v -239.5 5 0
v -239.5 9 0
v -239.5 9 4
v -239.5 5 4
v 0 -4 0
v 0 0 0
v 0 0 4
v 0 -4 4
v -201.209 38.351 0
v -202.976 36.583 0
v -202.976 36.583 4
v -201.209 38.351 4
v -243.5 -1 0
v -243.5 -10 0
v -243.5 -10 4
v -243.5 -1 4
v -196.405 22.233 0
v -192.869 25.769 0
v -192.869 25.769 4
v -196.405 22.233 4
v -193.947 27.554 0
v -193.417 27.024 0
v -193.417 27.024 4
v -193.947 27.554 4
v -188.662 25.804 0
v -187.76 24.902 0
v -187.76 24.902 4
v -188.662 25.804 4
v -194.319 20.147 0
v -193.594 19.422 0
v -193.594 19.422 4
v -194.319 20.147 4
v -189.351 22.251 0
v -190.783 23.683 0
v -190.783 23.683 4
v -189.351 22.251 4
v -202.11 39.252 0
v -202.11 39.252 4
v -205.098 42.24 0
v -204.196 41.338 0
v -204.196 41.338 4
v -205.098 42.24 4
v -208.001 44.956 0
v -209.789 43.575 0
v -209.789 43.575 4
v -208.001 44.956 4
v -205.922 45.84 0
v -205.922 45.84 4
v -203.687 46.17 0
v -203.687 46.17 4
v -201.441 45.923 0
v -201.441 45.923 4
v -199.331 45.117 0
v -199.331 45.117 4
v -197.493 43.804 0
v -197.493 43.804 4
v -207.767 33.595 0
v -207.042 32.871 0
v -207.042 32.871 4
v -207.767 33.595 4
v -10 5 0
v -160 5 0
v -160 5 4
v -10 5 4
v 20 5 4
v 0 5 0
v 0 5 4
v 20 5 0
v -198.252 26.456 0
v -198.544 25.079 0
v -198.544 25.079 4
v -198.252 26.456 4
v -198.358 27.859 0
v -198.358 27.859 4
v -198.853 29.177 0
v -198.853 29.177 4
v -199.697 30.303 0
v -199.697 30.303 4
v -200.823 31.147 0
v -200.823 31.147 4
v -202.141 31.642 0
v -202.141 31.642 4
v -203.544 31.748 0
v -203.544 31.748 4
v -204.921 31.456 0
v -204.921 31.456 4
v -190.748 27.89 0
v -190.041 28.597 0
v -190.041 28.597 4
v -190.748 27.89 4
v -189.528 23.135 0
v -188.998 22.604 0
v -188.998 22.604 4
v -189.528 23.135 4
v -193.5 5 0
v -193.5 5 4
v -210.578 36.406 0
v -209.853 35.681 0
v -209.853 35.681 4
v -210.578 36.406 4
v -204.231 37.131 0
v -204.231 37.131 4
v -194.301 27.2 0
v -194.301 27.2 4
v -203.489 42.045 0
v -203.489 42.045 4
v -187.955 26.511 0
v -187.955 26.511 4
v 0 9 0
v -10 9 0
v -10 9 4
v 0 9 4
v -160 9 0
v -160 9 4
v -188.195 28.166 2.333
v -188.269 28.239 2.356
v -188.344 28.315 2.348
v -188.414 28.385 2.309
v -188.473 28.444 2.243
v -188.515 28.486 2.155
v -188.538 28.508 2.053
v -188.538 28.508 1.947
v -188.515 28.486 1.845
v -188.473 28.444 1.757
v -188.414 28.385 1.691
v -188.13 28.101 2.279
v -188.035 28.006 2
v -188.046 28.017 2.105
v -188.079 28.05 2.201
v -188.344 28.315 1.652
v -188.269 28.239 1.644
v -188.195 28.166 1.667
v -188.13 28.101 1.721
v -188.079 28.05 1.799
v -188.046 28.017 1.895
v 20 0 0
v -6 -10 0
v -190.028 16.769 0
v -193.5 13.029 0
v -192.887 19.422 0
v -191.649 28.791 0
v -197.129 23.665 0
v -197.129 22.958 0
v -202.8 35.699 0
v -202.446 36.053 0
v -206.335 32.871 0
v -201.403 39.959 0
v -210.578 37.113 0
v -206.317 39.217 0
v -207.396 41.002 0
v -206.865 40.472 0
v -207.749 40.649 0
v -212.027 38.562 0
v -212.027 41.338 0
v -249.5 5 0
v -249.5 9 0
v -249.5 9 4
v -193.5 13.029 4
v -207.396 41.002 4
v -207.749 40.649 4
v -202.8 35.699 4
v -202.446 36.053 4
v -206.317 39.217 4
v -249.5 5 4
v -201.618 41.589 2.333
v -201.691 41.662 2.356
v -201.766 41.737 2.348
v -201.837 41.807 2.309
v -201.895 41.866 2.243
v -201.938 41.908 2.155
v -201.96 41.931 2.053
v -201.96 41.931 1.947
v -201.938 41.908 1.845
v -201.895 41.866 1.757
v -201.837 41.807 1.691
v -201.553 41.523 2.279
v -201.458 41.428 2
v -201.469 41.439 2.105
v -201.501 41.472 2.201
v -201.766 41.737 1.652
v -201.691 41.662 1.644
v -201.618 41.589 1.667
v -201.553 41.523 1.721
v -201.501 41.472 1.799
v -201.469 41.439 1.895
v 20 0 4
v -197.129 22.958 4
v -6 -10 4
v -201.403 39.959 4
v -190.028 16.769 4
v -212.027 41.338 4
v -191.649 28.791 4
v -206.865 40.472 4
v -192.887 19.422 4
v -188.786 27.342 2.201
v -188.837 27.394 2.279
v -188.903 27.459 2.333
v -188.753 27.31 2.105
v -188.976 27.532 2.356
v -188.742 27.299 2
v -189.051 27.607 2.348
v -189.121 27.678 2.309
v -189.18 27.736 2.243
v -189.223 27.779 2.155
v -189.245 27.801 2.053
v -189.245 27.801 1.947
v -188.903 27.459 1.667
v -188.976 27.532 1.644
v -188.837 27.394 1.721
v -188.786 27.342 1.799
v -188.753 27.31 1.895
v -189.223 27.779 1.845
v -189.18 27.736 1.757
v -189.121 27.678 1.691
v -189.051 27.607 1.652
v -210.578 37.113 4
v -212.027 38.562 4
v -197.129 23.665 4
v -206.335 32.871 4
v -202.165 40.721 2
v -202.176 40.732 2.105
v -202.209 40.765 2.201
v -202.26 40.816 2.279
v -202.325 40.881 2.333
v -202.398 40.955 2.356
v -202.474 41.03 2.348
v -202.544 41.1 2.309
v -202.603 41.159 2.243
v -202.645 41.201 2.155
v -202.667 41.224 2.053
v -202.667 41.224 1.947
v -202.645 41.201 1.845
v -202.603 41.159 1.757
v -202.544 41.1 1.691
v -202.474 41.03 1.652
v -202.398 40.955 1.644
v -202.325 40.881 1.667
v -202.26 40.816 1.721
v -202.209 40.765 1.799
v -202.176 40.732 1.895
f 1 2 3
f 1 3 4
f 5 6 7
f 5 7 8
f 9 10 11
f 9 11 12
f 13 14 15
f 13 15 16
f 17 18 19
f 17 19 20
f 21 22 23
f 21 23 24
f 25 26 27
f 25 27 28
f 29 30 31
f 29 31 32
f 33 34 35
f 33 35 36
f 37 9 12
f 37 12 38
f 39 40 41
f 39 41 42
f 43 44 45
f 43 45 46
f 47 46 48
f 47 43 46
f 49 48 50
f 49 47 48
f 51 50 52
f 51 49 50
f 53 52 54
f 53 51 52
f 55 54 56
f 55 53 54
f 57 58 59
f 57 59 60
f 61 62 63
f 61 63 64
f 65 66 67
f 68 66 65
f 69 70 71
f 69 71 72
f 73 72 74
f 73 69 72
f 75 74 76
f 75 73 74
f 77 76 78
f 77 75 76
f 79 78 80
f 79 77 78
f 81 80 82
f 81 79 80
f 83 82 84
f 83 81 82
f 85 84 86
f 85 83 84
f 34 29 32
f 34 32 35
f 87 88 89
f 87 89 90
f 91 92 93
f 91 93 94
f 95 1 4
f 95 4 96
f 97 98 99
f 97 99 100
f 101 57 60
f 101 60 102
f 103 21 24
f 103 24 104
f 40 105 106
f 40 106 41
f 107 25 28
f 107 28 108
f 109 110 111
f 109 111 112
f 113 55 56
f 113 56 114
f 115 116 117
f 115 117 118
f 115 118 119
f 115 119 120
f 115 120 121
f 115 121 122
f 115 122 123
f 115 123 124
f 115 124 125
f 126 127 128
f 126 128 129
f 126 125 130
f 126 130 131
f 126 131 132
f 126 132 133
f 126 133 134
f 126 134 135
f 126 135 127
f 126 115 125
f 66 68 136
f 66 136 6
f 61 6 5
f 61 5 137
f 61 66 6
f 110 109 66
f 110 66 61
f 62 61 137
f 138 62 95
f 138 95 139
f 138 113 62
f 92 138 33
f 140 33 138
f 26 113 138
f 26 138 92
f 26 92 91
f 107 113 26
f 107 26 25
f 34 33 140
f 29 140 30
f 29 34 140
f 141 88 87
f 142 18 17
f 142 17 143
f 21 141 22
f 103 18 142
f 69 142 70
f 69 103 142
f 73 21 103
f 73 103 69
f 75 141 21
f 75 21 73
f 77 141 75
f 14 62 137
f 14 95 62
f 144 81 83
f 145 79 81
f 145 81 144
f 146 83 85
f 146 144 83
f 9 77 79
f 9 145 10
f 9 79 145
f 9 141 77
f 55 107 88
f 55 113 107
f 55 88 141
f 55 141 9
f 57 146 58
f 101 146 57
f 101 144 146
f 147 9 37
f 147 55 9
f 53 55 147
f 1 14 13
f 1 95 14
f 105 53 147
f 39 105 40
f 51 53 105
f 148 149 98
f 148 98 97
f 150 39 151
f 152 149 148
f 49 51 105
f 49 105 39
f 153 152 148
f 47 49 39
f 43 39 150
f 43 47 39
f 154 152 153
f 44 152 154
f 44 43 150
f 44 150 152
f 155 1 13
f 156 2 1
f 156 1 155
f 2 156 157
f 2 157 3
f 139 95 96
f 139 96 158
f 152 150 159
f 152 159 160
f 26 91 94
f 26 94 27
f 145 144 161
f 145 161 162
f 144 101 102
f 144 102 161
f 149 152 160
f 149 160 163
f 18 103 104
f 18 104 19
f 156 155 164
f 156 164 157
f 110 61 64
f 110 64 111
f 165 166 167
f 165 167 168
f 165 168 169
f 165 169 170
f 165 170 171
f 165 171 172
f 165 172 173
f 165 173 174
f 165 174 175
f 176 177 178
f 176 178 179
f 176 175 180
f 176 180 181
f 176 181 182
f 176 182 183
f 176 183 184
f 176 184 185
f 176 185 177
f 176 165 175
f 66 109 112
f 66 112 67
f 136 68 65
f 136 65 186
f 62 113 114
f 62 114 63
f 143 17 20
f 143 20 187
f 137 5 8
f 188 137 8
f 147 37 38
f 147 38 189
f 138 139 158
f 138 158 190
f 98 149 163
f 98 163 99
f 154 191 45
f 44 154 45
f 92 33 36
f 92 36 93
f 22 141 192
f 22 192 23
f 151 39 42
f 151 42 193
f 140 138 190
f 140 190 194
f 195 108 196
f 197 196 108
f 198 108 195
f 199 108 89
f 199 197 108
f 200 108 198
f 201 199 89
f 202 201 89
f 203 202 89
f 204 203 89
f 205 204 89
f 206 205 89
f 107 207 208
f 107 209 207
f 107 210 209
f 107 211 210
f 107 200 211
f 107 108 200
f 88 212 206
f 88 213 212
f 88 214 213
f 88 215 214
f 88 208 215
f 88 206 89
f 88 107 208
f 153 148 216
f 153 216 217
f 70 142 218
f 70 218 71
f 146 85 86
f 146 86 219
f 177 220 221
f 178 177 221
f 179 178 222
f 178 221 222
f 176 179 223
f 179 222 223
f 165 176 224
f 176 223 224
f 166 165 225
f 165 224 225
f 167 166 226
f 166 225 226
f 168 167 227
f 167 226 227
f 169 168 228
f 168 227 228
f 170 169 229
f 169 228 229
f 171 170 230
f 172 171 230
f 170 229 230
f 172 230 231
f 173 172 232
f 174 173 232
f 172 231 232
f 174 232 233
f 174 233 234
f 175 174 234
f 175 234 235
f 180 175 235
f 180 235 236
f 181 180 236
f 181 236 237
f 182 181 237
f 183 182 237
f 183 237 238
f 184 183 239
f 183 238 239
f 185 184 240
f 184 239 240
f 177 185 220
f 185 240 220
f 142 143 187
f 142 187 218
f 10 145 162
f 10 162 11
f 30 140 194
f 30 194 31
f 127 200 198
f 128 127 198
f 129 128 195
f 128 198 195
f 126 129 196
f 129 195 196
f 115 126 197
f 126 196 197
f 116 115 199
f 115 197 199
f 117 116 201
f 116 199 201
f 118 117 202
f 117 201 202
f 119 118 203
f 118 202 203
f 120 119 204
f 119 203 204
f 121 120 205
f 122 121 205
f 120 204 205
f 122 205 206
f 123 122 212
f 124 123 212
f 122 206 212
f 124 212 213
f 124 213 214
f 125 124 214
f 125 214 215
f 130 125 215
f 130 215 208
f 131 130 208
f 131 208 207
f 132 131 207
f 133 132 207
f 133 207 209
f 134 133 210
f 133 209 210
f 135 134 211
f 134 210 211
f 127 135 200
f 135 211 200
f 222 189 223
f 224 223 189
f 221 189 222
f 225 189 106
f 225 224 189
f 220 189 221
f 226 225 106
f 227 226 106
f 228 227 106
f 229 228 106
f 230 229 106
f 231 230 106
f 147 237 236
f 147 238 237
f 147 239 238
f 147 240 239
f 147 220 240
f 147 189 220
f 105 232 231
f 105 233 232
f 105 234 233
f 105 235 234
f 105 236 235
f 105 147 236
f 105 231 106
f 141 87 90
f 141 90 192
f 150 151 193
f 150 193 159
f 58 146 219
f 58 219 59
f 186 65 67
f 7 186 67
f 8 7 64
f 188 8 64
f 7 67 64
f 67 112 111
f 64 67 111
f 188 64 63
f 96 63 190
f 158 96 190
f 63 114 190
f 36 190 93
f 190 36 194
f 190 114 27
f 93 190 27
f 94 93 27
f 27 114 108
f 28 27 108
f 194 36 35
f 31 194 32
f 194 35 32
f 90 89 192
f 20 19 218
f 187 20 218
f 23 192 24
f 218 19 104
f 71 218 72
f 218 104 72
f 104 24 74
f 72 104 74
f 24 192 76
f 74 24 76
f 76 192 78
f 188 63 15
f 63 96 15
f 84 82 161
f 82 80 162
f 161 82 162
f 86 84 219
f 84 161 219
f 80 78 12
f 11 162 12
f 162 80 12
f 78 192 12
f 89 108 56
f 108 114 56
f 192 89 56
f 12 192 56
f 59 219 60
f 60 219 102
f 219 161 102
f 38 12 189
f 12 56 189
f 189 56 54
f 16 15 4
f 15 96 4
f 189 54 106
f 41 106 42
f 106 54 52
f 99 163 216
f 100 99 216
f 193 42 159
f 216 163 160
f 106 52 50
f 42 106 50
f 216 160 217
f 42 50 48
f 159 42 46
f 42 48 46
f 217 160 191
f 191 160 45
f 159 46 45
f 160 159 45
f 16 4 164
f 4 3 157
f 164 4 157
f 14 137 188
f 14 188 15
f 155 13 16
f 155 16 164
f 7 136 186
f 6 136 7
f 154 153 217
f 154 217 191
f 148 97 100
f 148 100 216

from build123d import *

# Parameters (mm, degrees)
BOSS_EXTRUDE1_DEPTH = 4
CHAMFER1_SIZE       = 6
SKETCH2_R           = 0.357314597
CUT_EXTRUDE1_DEPTH  = 1


with BuildPart() as part:
    # Sketch1 → Boss-Extrude1 (new body)
    with BuildSketch(Plane.XY):
        with BuildLine():
            Line((-193.5, 5), (-193.5, 13.029022597))
            Line((-193.5, 13.029022597), (-190.028351822, 16.768866664))
            Line((-190.028351822, 16.768866664), (-192.886698165, 19.422232071))
            Line((-192.886698165, 19.422232071), (-193.593804946, 19.422232071))
            Line((-193.593804946, 19.422232071), (-194.318589397, 20.147016522))
            Line((-194.318589397, 20.147016522), (-190.783055491, 23.682550428))
            Line((-190.783055491, 23.682550428), (-189.351164259, 22.250659196))
            Line((-189.351164259, 22.250659196), (-188.997610869, 22.604212587))
            Line((-188.997610869, 22.604212587), (-189.527940955, 23.134542672))
            Line((-189.527940955, 23.134542672), (-187.760174002, 24.902309625))
            Line((-187.760174002, 24.902309625), (-188.661735148, 25.803870771))
            Line((-188.661735148, 25.803870771), (-187.954628366, 26.510977553))
            Line((-187.954628366, 26.510977553), (-190.040593371, 28.596942557))
            Line((-190.040593371, 28.596942557), (-190.747700152, 27.889835776))
            Line((-190.747700152, 27.889835776), (-191.649261298, 28.791396922))
            Line((-191.649261298, 28.791396922), (-193.417028251, 27.023629969))
            Line((-193.417028251, 27.023629969), (-193.947358337, 27.553960055))
            Line((-193.947358337, 27.553960055), (-194.300911728, 27.200406664))
            Line((-194.300911728, 27.200406664), (-192.869020496, 25.768515432))
            Line((-192.869020496, 25.768515432), (-196.404532161, 22.233003767))
            Line((-196.404532161, 22.233003767), (-197.129316611, 22.957788218))
            Line((-197.129316611, 22.957788218), (-197.129316611, 23.664894999))
            Line((-197.129316611, 23.664894999), (-198.543530174, 25.079108562))
            ThreePointArc((-198.543530174, 25.079108562), (-199.69683639, 30.30316361), (-204.920891438, 31.456469826))
            Line((-204.920891438, 31.456469826), (-206.335105001, 32.870683389))
            Line((-206.335105001, 32.870683389), (-207.042211782, 32.870683389))
            Line((-207.042211782, 32.870683389), (-207.766996233, 33.595467839))
            Line((-207.766996233, 33.595467839), (-204.231484568, 37.130979504))
            Line((-204.231484568, 37.130979504), (-202.799593336, 35.699088272))
            Line((-202.799593336, 35.699088272), (-202.446039945, 36.052641663))
            Line((-202.446039945, 36.052641663), (-202.976370031, 36.582971749))
            Line((-202.976370031, 36.582971749), (-201.208603078, 38.350738702))
            Line((-201.208603078, 38.350738702), (-202.110164224, 39.252299848))
            Line((-202.110164224, 39.252299848), (-201.403057443, 39.959406629))
            Line((-201.403057443, 39.959406629), (-203.489022447, 42.045371634))
            Line((-203.489022447, 42.045371634), (-204.196129229, 41.338264852))
            Line((-204.196129229, 41.338264852), (-205.097690375, 42.239825998))
            Line((-205.097690375, 42.239825998), (-206.865457328, 40.472059045))
            Line((-206.865457328, 40.472059045), (-207.395787413, 41.002389131))
            Line((-207.395787413, 41.002389131), (-207.749340804, 40.648835741))
            Line((-207.749340804, 40.648835741), (-206.317449572, 39.216944509))
            Line((-206.317449572, 39.216944509), (-209.852983478, 35.681410603))
            Line((-209.852983478, 35.681410603), (-210.577767929, 36.406195054))
            Line((-210.577767929, 36.406195054), (-210.577767929, 37.113301835))
            Line((-210.577767929, 37.113301835), (-212.026855734, 38.56238964))
            Line((-212.026855734, 38.56238964), (-212.026855734, 41.337590552))
            Line((-212.026855734, 41.337590552), (-209.789156947, 43.57528934))
            ThreePointArc((-209.789156947, 43.57528934), (-203.686966217, 46.169596994), (-197.492575262, 43.803865688))
            Line((-197.492575262, 43.803865688), (-160, 9))
            Line((-160, 9), (-160, 5))
            Line((-160, 5), (-10, 5))
            Line((-10, 5), (-10, 9))
            Line((-10, 9), (0, 9))
            Line((0, 9), (0, 5))
            Line((0, 5), (20, 5))
            Line((20, 5), (20, 0))
            Line((20, 0), (0, 0))
            Line((0, 0), (0, -10))
            Line((0, -10), (-243.5, -10))
            Line((-243.5, -10), (-243.5, -1))
            Line((-243.5, -1), (-249.5, 5))
            Line((-249.5, 5), (-249.5, 9))
            Line((-249.5, 9), (-239.5, 9))
            Line((-239.5, 9), (-239.5, 5))
            Line((-239.5, 5), (-193.5, 5))
        make_face()
    extrude(amount=BOSS_EXTRUDE1_DEPTH)

    # Chamfer1
    chamfer1_edges = [part.edges().sort_by_distance(p)[0] for p in [
        (0, -10, 2),
    ]]
    chamfer(chamfer1_edges, length=CHAMFER1_SIZE)

    # Sketch2 → Cut-Extrude1 (cut)
    with BuildSketch(Plane(origin=(-80.721825407, -80.721825407, 0), x_dir=(0, 0, 1), z_dir=(-0.7071067811865454, -0.7071067811865497, 0))):
        with Locations(Location((2, 172.10347727, 0), (0, 0, 270))):
            Circle(SKETCH2_R)
        with Locations(Location((2, 153.121208308, 0), (0, 0, 270))):
            Circle(SKETCH2_R)
    extrude(amount=-CUT_EXTRUDE1_DEPTH, mode=Mode.SUBTRACT)


solid = part.part
